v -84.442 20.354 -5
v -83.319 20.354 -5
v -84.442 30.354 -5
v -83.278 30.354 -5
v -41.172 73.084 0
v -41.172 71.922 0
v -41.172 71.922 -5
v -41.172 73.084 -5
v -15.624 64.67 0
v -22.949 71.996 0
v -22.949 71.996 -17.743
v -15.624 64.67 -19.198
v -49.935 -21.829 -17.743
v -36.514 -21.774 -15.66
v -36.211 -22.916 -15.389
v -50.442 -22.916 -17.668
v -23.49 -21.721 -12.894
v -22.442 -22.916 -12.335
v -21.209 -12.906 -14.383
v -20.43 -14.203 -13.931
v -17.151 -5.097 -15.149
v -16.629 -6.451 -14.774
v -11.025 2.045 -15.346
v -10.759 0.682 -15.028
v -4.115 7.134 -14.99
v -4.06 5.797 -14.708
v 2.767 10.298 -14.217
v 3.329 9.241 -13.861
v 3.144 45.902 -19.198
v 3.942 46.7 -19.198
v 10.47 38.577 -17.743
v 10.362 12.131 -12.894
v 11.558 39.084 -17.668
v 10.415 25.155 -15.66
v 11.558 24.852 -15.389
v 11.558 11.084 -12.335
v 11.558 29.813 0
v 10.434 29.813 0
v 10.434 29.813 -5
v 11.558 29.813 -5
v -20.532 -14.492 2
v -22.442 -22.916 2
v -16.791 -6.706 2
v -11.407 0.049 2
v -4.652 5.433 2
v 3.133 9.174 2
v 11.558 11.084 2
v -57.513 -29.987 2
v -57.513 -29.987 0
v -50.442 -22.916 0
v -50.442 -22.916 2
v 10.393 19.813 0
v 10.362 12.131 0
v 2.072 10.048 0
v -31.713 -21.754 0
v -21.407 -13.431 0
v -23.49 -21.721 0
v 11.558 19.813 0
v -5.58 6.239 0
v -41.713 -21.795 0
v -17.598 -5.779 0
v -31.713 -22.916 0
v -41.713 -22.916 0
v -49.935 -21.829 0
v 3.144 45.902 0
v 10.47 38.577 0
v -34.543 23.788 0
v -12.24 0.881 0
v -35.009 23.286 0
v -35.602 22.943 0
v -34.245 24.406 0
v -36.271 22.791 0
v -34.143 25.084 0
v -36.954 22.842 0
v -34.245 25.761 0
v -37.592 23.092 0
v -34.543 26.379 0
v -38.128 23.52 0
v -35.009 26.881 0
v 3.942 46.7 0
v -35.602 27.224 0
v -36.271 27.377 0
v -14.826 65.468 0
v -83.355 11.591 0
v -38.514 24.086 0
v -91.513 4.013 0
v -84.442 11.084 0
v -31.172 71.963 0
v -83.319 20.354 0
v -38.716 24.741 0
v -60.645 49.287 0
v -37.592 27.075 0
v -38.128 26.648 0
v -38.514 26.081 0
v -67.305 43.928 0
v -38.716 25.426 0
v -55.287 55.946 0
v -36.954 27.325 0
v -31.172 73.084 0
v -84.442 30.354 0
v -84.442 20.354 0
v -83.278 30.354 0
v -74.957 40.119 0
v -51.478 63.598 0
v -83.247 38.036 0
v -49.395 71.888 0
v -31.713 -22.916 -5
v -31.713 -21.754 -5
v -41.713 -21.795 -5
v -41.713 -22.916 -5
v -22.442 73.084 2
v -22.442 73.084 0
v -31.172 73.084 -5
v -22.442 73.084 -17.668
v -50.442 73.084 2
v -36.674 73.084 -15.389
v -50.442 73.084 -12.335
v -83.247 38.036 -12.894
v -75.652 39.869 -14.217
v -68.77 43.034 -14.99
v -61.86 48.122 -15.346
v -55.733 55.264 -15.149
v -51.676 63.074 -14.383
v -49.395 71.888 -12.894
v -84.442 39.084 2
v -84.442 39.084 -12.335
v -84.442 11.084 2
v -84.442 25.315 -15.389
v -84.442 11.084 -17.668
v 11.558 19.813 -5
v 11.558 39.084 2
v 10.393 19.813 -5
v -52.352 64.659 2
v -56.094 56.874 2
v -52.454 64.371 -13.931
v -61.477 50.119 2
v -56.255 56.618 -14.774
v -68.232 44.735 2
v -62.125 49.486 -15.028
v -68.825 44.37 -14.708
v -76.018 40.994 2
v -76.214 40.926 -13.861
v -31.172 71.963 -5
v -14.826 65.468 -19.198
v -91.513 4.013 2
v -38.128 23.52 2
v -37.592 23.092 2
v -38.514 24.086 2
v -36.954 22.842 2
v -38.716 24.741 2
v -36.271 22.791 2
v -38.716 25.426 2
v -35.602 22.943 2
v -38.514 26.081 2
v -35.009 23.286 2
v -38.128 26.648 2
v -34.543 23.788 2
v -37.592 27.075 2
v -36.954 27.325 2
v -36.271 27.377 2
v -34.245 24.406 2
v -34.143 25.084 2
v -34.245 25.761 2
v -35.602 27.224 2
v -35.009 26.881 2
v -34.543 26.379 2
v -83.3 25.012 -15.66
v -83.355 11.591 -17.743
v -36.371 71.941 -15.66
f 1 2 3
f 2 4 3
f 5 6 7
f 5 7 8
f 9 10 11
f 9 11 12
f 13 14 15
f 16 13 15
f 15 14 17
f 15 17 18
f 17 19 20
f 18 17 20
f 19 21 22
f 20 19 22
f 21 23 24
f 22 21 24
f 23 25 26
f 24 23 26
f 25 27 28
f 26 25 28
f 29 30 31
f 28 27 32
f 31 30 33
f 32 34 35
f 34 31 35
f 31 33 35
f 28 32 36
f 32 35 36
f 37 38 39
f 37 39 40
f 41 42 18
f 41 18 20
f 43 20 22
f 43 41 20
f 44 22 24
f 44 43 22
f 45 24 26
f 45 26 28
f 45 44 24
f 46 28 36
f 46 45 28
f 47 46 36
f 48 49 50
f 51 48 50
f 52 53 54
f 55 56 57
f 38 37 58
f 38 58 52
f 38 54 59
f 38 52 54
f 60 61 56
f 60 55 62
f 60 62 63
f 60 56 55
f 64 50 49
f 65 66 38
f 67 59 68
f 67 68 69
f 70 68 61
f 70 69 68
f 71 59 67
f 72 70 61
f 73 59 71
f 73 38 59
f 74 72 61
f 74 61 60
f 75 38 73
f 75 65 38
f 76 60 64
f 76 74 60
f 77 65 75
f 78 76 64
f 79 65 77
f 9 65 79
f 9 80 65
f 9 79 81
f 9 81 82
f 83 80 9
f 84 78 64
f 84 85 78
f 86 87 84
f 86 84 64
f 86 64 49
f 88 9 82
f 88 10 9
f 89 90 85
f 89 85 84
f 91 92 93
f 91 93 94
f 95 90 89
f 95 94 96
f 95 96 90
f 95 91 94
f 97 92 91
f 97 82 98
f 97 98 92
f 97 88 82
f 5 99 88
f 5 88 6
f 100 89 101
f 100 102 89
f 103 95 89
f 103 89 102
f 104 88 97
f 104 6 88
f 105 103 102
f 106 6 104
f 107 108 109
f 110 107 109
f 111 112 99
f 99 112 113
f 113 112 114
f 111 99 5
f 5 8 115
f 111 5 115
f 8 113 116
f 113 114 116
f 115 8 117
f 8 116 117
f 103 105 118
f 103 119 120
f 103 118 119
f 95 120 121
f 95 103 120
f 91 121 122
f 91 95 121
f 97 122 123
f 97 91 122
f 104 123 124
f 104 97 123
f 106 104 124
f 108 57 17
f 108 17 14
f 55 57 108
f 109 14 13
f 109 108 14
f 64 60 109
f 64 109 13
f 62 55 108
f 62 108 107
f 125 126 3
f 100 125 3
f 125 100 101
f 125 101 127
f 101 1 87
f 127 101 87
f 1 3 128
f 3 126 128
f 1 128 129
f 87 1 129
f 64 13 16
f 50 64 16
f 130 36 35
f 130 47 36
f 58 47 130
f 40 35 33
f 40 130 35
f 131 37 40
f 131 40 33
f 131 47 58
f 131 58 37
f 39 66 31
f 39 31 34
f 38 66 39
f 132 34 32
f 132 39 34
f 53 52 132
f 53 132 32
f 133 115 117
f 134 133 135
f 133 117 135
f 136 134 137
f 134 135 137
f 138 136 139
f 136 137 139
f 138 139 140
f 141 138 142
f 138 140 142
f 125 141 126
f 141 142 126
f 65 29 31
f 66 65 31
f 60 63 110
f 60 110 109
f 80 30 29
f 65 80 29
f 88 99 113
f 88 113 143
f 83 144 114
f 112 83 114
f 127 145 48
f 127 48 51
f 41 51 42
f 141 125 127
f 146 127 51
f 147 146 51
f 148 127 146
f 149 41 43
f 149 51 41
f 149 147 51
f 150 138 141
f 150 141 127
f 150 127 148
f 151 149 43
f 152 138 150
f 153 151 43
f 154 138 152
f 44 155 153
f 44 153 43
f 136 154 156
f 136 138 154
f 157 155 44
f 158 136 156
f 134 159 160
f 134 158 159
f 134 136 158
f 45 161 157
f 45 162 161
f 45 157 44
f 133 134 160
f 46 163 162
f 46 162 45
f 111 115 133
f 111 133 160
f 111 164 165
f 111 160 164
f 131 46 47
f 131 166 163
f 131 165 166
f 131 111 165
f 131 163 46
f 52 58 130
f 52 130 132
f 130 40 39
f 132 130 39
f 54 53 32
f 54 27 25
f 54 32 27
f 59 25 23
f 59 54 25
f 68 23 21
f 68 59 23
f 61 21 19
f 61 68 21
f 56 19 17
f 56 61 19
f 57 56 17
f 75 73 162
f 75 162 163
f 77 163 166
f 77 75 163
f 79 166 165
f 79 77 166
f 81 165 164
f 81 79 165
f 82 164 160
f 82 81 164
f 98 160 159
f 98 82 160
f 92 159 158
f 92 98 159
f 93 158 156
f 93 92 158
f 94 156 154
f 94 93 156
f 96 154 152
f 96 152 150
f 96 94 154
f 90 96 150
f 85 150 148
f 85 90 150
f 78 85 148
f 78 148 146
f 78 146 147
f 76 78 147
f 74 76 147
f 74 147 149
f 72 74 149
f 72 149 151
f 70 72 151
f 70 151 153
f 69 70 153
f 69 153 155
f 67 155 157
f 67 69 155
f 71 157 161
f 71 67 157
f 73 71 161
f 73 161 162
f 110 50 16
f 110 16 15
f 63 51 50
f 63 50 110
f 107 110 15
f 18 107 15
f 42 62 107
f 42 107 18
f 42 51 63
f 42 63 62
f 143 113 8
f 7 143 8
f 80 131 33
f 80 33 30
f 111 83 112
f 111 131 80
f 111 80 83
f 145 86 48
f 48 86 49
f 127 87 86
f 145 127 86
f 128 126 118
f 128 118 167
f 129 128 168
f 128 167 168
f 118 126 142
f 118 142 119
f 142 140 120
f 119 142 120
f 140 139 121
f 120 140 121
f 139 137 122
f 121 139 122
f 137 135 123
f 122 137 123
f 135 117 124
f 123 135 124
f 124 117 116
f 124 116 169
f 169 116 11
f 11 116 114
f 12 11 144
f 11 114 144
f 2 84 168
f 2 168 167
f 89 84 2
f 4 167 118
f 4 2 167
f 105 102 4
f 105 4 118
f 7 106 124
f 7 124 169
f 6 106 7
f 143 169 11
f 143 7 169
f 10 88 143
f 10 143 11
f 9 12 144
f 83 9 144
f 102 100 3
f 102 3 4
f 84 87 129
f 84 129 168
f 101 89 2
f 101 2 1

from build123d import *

# Parameters (mm, degrees)
SKETCH1_R           = 2.299249708
BOSS_EXTRUDE1_DEPTH = 2
BOSS_EXTRUDE2_DEPTH = 25
CUT_EXTRUDE1_DEPTH  = 5
CUT_EXTRUDE2_DEPTH  = 122.722871427


with BuildPart() as part:
    # Sketch1 → Boss-Extrude1 (new body)
    with BuildSketch(Plane.XY):
        with BuildLine():
            Line((-50.442352941, -22.916302521), (-22.442352941, -22.916302521))
            ThreePointArc((-22.442352941, -22.916302521), (-11.414384755, 0.055729293), (11.557647059, 11.083697479))
            Line((11.557647059, 11.083697479), (11.557647059, 39.083697479))
            Line((11.557647059, 39.083697479), (-22.442352941, 73.083697479))
            Line((-22.442352941, 73.083697479), (-50.442352941, 73.083697479))
            ThreePointArc((-50.442352941, 73.083697479), (-61.477304412, 50.118648949), (-84.442352941, 39.083697479))
            Line((-84.442352941, 39.083697479), (-84.442352941, 11.083697479))
            Line((-84.442352941, 11.083697479), (-91.513420753, 4.012629667))
            Line((-91.513420753, 4.012629667), (-57.513420753, -29.987370333))
            Line((-57.513420753, -29.987370333), (-50.442352941, -22.916302521))
        make_face()
        with Locations((-36.442352941, 25.083697479)):
            Circle(SKETCH1_R, mode=Mode.SUBTRACT)
    extrude(amount=BOSS_EXTRUDE1_DEPTH)

    # Sketch2 → Boss-Extrude2 (add)
    with BuildSketch(Plane.XY.offset(2)):
        with BuildLine():
            Line((11.557647059, 11.083697479), (11.557647059, 39.083697479))
            Line((11.557647059, 39.083697479), (3.941530535, 46.699814003))
            Line((3.941530535, 46.699814003), (3.144174906, 45.902458373))
            Line((3.144174906, 45.902458373), (10.470077714, 38.576555565))
            Line((10.470077714, 38.576555565), (10.361931826, 12.13145892))
            ThreePointArc((10.361931826, 12.13145892), (-12.239549802, 0.88089434), (-23.490114382, -21.720587289))
            Line((-23.490114382, -21.720587289), (-49.935211027, -21.828733177))
            Line((-49.935211027, -21.828733177), (-50.442352941, -22.916302521))
            Line((-50.442352941, -22.916302521), (-22.442352941, -22.916302521))
            ThreePointArc((-22.442352941, -22.916302521), (-11.407401471, 0.048746009), (11.557647059, 11.083697479))
        make_face()
        with BuildLine():
            Line((-22.442352941, 73.083697479), (-50.442352941, 73.083697479))
            ThreePointArc((-50.442352941, 73.083697479), (-61.477304412, 50.118648949), (-84.442352941, 39.083697479))
            Line((-84.442352941, 39.083697479), (-84.442352941, 11.083697479))
            Line((-84.442352941, 11.083697479), (-83.354783597, 11.590839393))
            Line((-83.354783597, 11.590839393), (-83.246637709, 38.035936038))
            ThreePointArc((-83.246637709, 38.035936038), (-60.64515608, 49.286500618), (-49.394591501, 71.887982247))
            Line((-49.394591501, 71.887982247), (-22.949494855, 71.996128135))
            Line((-22.949494855, 71.996128135), (-15.623592047, 64.670225326))
            Line((-15.623592047, 64.670225326), (-14.826236418, 65.467580955))
            Line((-14.826236418, 65.467580955), (-22.442352941, 73.083697479))
        make_face()
    extrude(amount=-BOSS_EXTRUDE2_DEPTH)

    # Sketch3 → Cut-Extrude1 (cut)
    with BuildSketch(Plane(origin=(0, 0, 0), x_dir=(-1, 0, 0), z_dir=(0, 0, -1))):
        Polygon((31.712662704, -21.754212985), (31.712662704, -22.916302521), (41.712662704, -22.916302521), (41.712662704, -21.79510748), (41.712662704, -21.572636028), (31.712662704, -21.531741532), align=None)
        Polygon((-10.395557523, 29.813387716), (-11.557647059, 29.813387716), (-11.557647059, 19.813387716), (-10.436452018, 19.813387716), (-10.213980565, 19.813387716), (-10.17308607, 29.813387716), align=None)
        Polygon((41.172043178, 71.921607943), (41.172043178, 73.083697479), (31.172043178, 73.083697479), (31.172043178, 71.962502438), (31.172043178, 71.740030985), (41.172043178, 71.69913649), align=None)
        Polygon((83.280263405, 20.354007242), (84.442352941, 20.354007242), (84.442352941, 30.354007242), (83.3211579, 30.354007242), (83.098686448, 30.354007242), (83.057791952, 20.354007242), align=None)
    extrude(amount=CUT_EXTRUDE1_DEPTH, mode=Mode.SUBTRACT)

    # Sketch4 → Cut-Extrude2 (cut, through all)
    with BuildSketch(Plane(origin=(25.320672269, 25.320672269, 0), x_dir=(0.707106781, -0.707106781, 0), z_dir=(0.707106781, 0.707106781, 0))):
        with BuildLine():
            Line((-87.346107905, 12.335462167), (-87.346107905, 23))
            Line((-87.346107905, 23), (0.335132962, 23))
            Line((0.335132962, 23), (0.335132962, 12.335462167))
            add(Edge.make_bspline(
                [(-87.346107905, 12.335462167), (-59.446253938, 22.367177976), (-27.564721006, 22.367177976), (0.335132962, 12.335462167)],
                knots=[0, 0, 0, 0, 1, 1, 1, 1], degree=3))
        make_face()
    extrude(amount=-CUT_EXTRUDE2_DEPTH, mode=Mode.SUBTRACT)


solid = part.part
